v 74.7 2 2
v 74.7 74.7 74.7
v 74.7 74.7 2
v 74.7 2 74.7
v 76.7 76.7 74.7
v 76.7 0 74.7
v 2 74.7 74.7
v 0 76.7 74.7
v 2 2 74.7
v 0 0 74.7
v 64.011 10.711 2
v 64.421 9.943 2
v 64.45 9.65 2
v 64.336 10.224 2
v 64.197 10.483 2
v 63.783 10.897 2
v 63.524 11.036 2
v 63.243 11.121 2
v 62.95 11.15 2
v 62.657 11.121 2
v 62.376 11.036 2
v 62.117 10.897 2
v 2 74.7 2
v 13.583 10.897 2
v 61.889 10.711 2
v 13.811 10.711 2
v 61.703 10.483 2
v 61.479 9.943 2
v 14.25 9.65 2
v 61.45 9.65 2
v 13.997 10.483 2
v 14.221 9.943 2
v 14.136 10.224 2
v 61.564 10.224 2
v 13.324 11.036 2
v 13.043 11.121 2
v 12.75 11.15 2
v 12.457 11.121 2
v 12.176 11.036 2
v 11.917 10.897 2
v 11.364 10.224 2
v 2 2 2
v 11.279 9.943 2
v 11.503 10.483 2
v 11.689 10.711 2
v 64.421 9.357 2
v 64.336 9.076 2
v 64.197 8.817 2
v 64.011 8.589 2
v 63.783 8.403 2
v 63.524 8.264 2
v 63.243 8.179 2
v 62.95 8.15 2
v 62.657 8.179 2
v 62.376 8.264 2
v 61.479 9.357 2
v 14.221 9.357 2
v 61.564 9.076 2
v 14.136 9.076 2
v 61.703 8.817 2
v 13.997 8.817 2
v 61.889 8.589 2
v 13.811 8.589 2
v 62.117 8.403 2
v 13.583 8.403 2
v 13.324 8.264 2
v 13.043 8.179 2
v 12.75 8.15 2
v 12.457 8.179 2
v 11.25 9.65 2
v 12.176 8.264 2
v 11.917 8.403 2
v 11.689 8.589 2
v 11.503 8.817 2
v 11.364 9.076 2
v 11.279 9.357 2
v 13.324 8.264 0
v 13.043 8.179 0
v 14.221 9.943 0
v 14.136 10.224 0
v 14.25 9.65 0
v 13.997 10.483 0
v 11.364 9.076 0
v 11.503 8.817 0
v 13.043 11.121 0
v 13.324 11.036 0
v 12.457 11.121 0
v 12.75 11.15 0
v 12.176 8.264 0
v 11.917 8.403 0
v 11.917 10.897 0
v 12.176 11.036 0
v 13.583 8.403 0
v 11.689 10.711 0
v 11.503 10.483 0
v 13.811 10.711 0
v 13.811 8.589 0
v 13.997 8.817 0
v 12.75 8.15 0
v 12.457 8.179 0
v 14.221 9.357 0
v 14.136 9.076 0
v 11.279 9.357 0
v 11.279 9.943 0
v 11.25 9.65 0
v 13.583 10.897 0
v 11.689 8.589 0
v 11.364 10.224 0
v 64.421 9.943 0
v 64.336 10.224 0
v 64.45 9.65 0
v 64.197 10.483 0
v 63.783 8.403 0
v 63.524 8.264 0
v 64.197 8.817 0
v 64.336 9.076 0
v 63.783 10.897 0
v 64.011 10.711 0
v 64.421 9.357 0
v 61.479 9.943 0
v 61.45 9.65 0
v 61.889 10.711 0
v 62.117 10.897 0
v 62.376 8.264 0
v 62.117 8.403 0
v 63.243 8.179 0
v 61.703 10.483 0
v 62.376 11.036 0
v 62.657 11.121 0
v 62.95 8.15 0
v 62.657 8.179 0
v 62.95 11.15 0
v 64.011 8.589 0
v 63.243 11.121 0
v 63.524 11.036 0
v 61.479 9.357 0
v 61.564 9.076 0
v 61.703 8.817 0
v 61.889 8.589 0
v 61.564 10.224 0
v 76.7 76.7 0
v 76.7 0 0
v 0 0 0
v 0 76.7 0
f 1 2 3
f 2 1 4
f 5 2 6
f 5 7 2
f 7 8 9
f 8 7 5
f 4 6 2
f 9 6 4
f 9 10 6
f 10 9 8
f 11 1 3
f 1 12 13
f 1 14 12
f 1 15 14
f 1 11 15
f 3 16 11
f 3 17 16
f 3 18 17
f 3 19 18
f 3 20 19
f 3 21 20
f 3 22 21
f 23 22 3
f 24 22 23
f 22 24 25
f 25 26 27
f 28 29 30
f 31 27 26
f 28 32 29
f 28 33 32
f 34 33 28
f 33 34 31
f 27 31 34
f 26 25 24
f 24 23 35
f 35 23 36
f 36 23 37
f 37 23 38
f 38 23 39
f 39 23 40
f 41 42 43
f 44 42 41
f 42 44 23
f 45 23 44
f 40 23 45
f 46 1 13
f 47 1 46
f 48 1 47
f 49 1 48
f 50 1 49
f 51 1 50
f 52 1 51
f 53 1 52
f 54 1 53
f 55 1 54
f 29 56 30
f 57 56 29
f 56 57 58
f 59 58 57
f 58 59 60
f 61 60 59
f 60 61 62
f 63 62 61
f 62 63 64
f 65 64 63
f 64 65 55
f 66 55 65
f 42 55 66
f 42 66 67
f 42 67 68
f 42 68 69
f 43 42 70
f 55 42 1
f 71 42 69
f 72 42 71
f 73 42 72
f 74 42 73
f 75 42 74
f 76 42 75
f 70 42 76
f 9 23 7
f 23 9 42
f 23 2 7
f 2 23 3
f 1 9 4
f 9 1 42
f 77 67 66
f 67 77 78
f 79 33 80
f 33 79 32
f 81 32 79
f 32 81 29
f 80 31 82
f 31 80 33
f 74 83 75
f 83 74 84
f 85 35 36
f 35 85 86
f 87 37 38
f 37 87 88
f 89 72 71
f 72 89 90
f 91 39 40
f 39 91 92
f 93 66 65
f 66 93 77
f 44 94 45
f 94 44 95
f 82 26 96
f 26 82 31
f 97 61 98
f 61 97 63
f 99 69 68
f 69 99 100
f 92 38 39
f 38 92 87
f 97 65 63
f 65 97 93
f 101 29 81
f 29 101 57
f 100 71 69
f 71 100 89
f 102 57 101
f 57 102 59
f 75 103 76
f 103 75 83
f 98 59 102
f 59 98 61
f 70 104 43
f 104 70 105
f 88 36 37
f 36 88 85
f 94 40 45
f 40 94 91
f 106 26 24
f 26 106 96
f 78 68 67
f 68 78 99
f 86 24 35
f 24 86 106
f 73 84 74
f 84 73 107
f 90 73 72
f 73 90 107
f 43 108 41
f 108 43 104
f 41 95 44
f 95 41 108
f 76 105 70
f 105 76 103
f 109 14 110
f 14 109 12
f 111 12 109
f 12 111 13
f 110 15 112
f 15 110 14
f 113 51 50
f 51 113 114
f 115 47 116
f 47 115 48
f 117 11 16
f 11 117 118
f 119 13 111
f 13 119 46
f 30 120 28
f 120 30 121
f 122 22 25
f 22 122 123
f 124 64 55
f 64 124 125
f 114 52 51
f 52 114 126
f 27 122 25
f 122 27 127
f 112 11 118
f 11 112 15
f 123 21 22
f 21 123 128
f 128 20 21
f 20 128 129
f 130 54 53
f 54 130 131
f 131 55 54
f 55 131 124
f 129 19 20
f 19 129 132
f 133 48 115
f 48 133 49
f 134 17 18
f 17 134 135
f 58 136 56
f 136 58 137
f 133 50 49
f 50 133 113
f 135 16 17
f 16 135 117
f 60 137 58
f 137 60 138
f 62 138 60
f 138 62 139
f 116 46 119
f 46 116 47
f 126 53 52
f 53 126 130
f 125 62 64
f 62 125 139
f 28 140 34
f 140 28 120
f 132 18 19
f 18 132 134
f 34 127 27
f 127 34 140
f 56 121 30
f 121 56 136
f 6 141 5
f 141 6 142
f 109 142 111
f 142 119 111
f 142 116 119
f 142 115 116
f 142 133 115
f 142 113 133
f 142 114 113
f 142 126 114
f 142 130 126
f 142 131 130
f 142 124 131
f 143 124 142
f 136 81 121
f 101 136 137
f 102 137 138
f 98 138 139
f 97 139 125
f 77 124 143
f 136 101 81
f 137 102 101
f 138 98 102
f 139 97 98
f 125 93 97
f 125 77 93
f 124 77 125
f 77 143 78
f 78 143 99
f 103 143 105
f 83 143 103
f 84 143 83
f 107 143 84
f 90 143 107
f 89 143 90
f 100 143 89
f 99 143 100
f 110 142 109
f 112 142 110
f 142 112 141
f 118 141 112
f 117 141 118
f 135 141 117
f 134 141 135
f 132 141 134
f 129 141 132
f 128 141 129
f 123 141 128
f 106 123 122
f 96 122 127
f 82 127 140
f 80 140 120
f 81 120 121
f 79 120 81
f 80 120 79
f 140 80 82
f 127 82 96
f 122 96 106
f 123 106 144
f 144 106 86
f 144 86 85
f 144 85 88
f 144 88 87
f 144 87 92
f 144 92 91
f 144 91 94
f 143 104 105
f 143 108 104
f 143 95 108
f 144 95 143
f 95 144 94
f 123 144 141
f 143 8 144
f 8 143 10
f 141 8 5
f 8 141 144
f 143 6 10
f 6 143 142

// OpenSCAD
// The dimensions of hole in the top of the box into which
// the receipt printer fits.
hole_x = 72.7;
hole_y = 73.2;
hole_z = 50;
screw_post_face_depth = 34.6;
screw_post_od = 6.5;
screw_post_offset_left_x = 14 - screw_post_od/2;
screw_post_offset_right_x = 15 - screw_post_od/2;
screw_post_offset_y = 4.4+screw_post_od/2;
screw_hole_r = 1.5;

batt_holder_x = 21.0;
batt_holder_y = 75.7;
batt_holder_z = 20.0;

batt_r = 18/2;
batt_x = 65;

wt=2;
$fn = 32;

module hole() {
    cube([hole_x, hole_x, hole_x]);
    translate([screw_post_offset_left_x, screw_post_offset_y,-100]) cylinder(r=screw_hole_r, h=100);
    translate([hole_x-screw_post_offset_right_x, screw_post_offset_y,-100]) cylinder(r=screw_hole_r, h=100);
}

module housing() {
    difference () {
        cube([hole_x+2*wt, hole_x+2*wt, hole_x+wt]);
        translate([wt,wt,wt]) hole();
        // #translate([wt,wt,wt]) rotate([0,0,0]) batt_holder();
    }
    // batt();
}

module batt_holder() {
    cube([batt_holder_y, batt_holder_x, batt_holder_z]);
}
module batt() {
    rotate([-90,0,0]) cylinder(r=batt_r, h=batt_x);
}

// hole();

housing();
// batt_holder();
